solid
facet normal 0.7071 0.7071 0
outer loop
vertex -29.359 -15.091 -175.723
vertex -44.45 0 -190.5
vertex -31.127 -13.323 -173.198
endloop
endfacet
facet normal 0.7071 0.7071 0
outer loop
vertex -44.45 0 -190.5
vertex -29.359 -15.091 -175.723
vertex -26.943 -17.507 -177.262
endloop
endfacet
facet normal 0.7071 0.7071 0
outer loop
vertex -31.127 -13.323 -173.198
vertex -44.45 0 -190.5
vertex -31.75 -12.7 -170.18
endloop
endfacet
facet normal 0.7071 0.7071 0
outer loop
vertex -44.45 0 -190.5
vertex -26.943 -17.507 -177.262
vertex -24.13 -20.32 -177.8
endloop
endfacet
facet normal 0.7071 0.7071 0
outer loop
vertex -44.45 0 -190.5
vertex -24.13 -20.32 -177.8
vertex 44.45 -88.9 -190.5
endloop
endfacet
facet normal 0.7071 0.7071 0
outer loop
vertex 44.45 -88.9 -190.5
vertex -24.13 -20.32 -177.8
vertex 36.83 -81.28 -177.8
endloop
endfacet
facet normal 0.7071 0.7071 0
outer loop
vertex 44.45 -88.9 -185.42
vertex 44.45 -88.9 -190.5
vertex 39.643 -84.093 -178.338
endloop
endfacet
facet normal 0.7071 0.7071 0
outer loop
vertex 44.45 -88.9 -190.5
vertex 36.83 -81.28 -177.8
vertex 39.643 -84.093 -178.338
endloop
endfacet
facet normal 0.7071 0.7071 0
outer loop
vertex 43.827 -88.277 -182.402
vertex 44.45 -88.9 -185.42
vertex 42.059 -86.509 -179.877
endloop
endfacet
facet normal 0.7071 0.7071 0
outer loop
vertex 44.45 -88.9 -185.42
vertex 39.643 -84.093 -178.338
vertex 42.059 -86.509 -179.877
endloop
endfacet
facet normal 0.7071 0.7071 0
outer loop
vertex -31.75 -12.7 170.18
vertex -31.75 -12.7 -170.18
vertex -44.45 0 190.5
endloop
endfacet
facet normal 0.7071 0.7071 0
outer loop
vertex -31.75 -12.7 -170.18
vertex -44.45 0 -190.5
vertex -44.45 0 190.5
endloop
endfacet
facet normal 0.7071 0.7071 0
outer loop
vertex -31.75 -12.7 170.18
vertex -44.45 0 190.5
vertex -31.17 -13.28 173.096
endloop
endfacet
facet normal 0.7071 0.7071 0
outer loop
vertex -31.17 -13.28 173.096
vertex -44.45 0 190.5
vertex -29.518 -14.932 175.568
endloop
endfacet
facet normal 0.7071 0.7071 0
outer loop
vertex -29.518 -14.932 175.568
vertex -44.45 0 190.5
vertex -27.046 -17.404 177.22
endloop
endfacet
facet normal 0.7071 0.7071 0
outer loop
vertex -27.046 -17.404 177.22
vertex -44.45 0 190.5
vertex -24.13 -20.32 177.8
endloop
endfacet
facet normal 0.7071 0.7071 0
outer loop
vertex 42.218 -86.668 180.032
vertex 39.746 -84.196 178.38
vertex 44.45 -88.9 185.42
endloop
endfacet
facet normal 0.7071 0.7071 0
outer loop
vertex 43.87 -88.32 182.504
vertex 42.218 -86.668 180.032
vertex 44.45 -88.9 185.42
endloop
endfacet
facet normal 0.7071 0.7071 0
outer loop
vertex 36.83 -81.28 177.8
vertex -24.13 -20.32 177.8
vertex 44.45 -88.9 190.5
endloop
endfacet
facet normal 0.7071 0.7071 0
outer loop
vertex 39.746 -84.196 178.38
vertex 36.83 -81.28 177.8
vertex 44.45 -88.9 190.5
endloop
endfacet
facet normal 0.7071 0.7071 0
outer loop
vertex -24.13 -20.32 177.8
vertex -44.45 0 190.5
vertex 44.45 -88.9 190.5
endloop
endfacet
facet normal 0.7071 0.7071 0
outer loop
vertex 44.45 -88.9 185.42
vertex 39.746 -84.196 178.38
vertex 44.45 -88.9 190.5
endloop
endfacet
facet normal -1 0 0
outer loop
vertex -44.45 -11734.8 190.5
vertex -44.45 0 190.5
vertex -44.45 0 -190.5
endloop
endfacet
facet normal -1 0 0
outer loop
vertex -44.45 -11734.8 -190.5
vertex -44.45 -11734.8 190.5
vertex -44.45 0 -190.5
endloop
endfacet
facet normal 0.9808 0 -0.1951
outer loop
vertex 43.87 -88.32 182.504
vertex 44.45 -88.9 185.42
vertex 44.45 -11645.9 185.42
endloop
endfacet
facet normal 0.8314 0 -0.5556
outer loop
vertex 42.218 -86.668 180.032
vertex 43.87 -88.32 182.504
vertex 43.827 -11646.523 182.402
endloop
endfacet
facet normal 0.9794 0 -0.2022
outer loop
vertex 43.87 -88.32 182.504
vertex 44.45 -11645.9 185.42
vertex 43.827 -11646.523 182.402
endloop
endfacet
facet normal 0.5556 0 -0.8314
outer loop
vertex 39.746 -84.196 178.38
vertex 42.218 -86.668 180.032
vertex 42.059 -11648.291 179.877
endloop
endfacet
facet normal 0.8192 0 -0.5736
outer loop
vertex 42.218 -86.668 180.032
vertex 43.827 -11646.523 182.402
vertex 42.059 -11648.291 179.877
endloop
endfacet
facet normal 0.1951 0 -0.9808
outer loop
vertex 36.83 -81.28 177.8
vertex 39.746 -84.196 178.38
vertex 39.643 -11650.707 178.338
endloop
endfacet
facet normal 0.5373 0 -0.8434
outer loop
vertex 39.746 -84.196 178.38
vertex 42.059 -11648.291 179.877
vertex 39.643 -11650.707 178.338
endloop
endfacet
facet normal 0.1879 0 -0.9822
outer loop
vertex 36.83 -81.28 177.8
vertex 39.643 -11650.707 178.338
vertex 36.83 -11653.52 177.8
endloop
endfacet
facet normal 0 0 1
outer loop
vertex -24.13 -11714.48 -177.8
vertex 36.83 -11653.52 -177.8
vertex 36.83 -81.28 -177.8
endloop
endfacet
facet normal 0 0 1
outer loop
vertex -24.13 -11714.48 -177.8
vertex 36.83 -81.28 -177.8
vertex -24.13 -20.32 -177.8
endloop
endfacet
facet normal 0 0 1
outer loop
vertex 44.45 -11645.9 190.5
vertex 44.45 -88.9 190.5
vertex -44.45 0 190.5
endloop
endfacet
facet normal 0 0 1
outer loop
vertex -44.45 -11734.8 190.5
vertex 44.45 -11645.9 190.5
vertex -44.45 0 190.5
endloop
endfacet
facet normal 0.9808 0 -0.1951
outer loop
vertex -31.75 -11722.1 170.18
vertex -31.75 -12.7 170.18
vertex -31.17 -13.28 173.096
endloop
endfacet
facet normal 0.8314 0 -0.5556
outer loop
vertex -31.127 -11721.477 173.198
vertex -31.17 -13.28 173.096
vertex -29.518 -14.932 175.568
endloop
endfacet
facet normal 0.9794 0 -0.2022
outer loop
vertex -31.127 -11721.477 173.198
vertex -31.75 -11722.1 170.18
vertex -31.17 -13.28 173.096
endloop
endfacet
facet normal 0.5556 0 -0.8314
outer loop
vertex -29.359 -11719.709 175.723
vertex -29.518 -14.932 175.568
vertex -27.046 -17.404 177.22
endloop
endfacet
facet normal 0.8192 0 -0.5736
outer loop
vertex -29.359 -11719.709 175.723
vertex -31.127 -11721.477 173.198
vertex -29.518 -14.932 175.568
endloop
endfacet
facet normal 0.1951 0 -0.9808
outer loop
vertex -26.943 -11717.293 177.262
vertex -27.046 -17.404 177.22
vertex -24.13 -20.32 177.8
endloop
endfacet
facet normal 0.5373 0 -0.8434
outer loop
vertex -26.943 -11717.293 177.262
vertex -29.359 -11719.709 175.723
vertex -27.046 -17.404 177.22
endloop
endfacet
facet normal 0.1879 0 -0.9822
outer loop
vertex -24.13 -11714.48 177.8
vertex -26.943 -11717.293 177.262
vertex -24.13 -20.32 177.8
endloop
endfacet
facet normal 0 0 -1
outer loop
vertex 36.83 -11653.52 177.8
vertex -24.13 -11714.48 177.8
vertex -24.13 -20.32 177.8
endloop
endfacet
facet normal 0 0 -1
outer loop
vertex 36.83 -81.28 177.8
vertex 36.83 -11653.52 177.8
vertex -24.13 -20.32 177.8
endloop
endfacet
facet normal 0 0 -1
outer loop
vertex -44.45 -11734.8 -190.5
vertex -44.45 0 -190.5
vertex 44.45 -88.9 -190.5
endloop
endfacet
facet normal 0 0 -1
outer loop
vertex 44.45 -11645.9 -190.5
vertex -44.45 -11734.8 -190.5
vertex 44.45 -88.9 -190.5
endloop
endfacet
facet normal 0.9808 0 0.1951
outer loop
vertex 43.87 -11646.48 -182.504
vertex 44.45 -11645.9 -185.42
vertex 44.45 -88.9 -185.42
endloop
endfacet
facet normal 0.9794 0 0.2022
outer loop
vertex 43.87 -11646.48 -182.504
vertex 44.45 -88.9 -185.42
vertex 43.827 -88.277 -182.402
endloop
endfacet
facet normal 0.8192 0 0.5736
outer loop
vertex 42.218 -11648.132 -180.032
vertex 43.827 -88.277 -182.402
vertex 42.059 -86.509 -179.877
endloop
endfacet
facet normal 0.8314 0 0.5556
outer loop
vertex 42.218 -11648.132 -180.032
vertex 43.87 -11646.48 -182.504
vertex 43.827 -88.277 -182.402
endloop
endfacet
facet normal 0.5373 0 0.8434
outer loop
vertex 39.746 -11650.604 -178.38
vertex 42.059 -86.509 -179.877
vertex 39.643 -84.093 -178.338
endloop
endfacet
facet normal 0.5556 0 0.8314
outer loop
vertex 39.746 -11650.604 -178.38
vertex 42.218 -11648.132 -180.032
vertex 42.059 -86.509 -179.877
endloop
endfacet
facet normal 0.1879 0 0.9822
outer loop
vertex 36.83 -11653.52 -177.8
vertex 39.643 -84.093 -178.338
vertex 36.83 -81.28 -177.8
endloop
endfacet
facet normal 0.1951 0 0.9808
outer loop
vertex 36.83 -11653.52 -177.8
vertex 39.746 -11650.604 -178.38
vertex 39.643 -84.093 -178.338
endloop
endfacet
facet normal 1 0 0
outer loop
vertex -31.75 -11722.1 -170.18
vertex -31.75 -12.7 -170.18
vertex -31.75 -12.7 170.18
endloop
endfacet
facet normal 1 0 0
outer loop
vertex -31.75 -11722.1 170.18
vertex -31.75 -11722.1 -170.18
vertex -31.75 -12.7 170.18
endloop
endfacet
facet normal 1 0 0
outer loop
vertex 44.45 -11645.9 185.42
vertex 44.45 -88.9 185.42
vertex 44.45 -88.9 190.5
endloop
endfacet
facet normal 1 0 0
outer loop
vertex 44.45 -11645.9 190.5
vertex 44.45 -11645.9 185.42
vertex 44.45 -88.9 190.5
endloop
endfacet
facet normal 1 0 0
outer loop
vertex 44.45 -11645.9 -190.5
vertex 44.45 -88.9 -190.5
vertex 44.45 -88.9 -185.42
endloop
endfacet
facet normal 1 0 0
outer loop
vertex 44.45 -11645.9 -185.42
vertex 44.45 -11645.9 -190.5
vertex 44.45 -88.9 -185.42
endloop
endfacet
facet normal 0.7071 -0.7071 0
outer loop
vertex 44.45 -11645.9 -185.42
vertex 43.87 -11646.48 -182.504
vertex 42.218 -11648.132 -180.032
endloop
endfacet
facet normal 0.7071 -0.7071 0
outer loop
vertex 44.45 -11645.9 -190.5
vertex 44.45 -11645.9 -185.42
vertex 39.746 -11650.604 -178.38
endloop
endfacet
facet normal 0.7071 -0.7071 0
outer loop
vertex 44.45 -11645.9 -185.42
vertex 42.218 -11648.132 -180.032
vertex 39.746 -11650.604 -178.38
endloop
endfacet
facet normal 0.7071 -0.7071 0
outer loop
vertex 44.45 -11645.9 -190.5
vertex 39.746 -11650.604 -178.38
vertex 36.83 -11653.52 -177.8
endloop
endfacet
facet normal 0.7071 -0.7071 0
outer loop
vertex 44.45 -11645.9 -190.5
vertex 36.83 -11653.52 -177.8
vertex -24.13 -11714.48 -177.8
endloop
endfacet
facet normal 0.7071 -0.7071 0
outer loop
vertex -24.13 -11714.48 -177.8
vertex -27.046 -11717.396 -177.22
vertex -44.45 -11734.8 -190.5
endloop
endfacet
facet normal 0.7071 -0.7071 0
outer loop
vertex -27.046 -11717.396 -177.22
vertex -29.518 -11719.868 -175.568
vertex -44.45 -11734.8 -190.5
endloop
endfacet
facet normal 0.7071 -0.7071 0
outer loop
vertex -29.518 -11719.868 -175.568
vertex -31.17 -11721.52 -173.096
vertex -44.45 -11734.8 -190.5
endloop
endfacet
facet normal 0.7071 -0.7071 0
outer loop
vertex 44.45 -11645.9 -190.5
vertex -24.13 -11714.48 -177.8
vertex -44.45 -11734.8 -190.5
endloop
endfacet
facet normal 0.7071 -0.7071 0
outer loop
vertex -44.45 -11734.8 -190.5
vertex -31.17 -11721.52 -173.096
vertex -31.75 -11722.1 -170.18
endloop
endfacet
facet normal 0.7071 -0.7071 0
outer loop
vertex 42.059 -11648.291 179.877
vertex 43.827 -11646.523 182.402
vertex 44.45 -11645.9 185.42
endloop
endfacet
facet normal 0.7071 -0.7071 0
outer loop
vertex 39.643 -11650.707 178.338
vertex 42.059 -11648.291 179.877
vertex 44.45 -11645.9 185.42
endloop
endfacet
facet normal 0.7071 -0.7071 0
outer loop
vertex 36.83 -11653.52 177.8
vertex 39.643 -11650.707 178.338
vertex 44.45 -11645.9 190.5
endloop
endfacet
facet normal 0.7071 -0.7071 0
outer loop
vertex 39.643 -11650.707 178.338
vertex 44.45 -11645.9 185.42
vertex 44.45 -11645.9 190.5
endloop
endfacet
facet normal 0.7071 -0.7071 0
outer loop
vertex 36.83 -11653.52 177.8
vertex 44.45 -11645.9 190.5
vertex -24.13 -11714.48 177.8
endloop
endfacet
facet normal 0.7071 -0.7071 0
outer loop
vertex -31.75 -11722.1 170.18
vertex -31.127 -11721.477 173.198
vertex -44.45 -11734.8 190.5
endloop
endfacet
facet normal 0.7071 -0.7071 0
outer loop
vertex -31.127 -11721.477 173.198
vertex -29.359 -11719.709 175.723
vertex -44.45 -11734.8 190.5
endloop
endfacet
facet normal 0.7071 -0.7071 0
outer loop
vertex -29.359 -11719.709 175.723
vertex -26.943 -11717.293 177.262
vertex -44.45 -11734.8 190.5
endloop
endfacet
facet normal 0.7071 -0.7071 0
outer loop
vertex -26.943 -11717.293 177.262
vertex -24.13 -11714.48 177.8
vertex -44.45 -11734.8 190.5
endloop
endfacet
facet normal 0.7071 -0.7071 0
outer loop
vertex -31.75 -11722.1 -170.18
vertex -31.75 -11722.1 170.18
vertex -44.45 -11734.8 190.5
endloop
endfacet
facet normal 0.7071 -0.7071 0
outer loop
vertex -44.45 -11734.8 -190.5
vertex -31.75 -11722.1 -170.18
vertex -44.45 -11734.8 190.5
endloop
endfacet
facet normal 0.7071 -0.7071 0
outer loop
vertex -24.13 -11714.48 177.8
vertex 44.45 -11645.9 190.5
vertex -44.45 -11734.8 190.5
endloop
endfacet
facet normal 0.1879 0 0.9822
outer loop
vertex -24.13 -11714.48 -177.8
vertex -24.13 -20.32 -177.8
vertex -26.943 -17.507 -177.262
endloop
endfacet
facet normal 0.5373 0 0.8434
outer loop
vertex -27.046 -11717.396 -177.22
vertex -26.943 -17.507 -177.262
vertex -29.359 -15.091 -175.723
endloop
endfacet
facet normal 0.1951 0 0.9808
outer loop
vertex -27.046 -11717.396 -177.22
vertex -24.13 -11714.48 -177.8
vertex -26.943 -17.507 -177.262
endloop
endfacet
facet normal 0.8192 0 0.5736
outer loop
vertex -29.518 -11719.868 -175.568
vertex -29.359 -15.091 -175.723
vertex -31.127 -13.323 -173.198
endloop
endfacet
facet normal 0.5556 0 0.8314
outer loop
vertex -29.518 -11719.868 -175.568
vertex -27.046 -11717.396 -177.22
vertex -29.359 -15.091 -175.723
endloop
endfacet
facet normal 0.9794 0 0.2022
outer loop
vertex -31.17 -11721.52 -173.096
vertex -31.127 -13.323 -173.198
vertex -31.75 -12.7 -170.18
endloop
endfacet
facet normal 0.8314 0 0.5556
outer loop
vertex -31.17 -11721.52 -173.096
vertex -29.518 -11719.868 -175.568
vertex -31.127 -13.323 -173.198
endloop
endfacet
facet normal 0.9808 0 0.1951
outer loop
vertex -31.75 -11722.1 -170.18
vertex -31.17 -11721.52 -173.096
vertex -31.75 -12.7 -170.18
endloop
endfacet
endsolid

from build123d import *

# Parameters (mm, degrees)
F1_DEPTH = 11734.8
F2_R     = 7.62
F4_DEPTH = 381.001
F5_DEPTH = 381.001


with BuildPart() as f1:
    # F0 (on Front) → F1 (new body)
    with BuildSketch(Plane.XZ):
        Polygon((44.45, 177.8), (44.45, 190.5), (-44.45, 190.5), (-44.45, -190.5), (44.45, -190.5), (44.45, -177.8), (-31.75, -177.8), (-31.75, 177.8), align=None)
    extrude(amount=F1_DEPTH)

    # F2
    f2_edges = [f1.edges().sort_by_distance(p)[0] for p in [
        (44.45, -5867.4, -177.8),
        (-31.75, -5867.4, -177.8),
        (-31.75, -5867.4, 177.8),
        (44.45, -5867.4, 177.8),
    ]]
    fillet(f2_edges, radius=F2_R)

    # F3 (on face) → F4 (cut, through all)
    with BuildSketch(Plane.XY.offset(190.5)):
        Polygon((44.45, 0), (-44.45, 0), (44.45, -88.9), align=None)
    extrude(amount=-F4_DEPTH, mode=Mode.SUBTRACT)

    # F3 (on face) → F5 (cut, through all)
    with BuildSketch(Plane.XY.offset(190.5)):
        Polygon((44.45, -11645.9), (-44.45, -11734.8), (44.45, -11734.8), align=None)
    extrude(amount=-F5_DEPTH, mode=Mode.SUBTRACT)


solid = f1.part
